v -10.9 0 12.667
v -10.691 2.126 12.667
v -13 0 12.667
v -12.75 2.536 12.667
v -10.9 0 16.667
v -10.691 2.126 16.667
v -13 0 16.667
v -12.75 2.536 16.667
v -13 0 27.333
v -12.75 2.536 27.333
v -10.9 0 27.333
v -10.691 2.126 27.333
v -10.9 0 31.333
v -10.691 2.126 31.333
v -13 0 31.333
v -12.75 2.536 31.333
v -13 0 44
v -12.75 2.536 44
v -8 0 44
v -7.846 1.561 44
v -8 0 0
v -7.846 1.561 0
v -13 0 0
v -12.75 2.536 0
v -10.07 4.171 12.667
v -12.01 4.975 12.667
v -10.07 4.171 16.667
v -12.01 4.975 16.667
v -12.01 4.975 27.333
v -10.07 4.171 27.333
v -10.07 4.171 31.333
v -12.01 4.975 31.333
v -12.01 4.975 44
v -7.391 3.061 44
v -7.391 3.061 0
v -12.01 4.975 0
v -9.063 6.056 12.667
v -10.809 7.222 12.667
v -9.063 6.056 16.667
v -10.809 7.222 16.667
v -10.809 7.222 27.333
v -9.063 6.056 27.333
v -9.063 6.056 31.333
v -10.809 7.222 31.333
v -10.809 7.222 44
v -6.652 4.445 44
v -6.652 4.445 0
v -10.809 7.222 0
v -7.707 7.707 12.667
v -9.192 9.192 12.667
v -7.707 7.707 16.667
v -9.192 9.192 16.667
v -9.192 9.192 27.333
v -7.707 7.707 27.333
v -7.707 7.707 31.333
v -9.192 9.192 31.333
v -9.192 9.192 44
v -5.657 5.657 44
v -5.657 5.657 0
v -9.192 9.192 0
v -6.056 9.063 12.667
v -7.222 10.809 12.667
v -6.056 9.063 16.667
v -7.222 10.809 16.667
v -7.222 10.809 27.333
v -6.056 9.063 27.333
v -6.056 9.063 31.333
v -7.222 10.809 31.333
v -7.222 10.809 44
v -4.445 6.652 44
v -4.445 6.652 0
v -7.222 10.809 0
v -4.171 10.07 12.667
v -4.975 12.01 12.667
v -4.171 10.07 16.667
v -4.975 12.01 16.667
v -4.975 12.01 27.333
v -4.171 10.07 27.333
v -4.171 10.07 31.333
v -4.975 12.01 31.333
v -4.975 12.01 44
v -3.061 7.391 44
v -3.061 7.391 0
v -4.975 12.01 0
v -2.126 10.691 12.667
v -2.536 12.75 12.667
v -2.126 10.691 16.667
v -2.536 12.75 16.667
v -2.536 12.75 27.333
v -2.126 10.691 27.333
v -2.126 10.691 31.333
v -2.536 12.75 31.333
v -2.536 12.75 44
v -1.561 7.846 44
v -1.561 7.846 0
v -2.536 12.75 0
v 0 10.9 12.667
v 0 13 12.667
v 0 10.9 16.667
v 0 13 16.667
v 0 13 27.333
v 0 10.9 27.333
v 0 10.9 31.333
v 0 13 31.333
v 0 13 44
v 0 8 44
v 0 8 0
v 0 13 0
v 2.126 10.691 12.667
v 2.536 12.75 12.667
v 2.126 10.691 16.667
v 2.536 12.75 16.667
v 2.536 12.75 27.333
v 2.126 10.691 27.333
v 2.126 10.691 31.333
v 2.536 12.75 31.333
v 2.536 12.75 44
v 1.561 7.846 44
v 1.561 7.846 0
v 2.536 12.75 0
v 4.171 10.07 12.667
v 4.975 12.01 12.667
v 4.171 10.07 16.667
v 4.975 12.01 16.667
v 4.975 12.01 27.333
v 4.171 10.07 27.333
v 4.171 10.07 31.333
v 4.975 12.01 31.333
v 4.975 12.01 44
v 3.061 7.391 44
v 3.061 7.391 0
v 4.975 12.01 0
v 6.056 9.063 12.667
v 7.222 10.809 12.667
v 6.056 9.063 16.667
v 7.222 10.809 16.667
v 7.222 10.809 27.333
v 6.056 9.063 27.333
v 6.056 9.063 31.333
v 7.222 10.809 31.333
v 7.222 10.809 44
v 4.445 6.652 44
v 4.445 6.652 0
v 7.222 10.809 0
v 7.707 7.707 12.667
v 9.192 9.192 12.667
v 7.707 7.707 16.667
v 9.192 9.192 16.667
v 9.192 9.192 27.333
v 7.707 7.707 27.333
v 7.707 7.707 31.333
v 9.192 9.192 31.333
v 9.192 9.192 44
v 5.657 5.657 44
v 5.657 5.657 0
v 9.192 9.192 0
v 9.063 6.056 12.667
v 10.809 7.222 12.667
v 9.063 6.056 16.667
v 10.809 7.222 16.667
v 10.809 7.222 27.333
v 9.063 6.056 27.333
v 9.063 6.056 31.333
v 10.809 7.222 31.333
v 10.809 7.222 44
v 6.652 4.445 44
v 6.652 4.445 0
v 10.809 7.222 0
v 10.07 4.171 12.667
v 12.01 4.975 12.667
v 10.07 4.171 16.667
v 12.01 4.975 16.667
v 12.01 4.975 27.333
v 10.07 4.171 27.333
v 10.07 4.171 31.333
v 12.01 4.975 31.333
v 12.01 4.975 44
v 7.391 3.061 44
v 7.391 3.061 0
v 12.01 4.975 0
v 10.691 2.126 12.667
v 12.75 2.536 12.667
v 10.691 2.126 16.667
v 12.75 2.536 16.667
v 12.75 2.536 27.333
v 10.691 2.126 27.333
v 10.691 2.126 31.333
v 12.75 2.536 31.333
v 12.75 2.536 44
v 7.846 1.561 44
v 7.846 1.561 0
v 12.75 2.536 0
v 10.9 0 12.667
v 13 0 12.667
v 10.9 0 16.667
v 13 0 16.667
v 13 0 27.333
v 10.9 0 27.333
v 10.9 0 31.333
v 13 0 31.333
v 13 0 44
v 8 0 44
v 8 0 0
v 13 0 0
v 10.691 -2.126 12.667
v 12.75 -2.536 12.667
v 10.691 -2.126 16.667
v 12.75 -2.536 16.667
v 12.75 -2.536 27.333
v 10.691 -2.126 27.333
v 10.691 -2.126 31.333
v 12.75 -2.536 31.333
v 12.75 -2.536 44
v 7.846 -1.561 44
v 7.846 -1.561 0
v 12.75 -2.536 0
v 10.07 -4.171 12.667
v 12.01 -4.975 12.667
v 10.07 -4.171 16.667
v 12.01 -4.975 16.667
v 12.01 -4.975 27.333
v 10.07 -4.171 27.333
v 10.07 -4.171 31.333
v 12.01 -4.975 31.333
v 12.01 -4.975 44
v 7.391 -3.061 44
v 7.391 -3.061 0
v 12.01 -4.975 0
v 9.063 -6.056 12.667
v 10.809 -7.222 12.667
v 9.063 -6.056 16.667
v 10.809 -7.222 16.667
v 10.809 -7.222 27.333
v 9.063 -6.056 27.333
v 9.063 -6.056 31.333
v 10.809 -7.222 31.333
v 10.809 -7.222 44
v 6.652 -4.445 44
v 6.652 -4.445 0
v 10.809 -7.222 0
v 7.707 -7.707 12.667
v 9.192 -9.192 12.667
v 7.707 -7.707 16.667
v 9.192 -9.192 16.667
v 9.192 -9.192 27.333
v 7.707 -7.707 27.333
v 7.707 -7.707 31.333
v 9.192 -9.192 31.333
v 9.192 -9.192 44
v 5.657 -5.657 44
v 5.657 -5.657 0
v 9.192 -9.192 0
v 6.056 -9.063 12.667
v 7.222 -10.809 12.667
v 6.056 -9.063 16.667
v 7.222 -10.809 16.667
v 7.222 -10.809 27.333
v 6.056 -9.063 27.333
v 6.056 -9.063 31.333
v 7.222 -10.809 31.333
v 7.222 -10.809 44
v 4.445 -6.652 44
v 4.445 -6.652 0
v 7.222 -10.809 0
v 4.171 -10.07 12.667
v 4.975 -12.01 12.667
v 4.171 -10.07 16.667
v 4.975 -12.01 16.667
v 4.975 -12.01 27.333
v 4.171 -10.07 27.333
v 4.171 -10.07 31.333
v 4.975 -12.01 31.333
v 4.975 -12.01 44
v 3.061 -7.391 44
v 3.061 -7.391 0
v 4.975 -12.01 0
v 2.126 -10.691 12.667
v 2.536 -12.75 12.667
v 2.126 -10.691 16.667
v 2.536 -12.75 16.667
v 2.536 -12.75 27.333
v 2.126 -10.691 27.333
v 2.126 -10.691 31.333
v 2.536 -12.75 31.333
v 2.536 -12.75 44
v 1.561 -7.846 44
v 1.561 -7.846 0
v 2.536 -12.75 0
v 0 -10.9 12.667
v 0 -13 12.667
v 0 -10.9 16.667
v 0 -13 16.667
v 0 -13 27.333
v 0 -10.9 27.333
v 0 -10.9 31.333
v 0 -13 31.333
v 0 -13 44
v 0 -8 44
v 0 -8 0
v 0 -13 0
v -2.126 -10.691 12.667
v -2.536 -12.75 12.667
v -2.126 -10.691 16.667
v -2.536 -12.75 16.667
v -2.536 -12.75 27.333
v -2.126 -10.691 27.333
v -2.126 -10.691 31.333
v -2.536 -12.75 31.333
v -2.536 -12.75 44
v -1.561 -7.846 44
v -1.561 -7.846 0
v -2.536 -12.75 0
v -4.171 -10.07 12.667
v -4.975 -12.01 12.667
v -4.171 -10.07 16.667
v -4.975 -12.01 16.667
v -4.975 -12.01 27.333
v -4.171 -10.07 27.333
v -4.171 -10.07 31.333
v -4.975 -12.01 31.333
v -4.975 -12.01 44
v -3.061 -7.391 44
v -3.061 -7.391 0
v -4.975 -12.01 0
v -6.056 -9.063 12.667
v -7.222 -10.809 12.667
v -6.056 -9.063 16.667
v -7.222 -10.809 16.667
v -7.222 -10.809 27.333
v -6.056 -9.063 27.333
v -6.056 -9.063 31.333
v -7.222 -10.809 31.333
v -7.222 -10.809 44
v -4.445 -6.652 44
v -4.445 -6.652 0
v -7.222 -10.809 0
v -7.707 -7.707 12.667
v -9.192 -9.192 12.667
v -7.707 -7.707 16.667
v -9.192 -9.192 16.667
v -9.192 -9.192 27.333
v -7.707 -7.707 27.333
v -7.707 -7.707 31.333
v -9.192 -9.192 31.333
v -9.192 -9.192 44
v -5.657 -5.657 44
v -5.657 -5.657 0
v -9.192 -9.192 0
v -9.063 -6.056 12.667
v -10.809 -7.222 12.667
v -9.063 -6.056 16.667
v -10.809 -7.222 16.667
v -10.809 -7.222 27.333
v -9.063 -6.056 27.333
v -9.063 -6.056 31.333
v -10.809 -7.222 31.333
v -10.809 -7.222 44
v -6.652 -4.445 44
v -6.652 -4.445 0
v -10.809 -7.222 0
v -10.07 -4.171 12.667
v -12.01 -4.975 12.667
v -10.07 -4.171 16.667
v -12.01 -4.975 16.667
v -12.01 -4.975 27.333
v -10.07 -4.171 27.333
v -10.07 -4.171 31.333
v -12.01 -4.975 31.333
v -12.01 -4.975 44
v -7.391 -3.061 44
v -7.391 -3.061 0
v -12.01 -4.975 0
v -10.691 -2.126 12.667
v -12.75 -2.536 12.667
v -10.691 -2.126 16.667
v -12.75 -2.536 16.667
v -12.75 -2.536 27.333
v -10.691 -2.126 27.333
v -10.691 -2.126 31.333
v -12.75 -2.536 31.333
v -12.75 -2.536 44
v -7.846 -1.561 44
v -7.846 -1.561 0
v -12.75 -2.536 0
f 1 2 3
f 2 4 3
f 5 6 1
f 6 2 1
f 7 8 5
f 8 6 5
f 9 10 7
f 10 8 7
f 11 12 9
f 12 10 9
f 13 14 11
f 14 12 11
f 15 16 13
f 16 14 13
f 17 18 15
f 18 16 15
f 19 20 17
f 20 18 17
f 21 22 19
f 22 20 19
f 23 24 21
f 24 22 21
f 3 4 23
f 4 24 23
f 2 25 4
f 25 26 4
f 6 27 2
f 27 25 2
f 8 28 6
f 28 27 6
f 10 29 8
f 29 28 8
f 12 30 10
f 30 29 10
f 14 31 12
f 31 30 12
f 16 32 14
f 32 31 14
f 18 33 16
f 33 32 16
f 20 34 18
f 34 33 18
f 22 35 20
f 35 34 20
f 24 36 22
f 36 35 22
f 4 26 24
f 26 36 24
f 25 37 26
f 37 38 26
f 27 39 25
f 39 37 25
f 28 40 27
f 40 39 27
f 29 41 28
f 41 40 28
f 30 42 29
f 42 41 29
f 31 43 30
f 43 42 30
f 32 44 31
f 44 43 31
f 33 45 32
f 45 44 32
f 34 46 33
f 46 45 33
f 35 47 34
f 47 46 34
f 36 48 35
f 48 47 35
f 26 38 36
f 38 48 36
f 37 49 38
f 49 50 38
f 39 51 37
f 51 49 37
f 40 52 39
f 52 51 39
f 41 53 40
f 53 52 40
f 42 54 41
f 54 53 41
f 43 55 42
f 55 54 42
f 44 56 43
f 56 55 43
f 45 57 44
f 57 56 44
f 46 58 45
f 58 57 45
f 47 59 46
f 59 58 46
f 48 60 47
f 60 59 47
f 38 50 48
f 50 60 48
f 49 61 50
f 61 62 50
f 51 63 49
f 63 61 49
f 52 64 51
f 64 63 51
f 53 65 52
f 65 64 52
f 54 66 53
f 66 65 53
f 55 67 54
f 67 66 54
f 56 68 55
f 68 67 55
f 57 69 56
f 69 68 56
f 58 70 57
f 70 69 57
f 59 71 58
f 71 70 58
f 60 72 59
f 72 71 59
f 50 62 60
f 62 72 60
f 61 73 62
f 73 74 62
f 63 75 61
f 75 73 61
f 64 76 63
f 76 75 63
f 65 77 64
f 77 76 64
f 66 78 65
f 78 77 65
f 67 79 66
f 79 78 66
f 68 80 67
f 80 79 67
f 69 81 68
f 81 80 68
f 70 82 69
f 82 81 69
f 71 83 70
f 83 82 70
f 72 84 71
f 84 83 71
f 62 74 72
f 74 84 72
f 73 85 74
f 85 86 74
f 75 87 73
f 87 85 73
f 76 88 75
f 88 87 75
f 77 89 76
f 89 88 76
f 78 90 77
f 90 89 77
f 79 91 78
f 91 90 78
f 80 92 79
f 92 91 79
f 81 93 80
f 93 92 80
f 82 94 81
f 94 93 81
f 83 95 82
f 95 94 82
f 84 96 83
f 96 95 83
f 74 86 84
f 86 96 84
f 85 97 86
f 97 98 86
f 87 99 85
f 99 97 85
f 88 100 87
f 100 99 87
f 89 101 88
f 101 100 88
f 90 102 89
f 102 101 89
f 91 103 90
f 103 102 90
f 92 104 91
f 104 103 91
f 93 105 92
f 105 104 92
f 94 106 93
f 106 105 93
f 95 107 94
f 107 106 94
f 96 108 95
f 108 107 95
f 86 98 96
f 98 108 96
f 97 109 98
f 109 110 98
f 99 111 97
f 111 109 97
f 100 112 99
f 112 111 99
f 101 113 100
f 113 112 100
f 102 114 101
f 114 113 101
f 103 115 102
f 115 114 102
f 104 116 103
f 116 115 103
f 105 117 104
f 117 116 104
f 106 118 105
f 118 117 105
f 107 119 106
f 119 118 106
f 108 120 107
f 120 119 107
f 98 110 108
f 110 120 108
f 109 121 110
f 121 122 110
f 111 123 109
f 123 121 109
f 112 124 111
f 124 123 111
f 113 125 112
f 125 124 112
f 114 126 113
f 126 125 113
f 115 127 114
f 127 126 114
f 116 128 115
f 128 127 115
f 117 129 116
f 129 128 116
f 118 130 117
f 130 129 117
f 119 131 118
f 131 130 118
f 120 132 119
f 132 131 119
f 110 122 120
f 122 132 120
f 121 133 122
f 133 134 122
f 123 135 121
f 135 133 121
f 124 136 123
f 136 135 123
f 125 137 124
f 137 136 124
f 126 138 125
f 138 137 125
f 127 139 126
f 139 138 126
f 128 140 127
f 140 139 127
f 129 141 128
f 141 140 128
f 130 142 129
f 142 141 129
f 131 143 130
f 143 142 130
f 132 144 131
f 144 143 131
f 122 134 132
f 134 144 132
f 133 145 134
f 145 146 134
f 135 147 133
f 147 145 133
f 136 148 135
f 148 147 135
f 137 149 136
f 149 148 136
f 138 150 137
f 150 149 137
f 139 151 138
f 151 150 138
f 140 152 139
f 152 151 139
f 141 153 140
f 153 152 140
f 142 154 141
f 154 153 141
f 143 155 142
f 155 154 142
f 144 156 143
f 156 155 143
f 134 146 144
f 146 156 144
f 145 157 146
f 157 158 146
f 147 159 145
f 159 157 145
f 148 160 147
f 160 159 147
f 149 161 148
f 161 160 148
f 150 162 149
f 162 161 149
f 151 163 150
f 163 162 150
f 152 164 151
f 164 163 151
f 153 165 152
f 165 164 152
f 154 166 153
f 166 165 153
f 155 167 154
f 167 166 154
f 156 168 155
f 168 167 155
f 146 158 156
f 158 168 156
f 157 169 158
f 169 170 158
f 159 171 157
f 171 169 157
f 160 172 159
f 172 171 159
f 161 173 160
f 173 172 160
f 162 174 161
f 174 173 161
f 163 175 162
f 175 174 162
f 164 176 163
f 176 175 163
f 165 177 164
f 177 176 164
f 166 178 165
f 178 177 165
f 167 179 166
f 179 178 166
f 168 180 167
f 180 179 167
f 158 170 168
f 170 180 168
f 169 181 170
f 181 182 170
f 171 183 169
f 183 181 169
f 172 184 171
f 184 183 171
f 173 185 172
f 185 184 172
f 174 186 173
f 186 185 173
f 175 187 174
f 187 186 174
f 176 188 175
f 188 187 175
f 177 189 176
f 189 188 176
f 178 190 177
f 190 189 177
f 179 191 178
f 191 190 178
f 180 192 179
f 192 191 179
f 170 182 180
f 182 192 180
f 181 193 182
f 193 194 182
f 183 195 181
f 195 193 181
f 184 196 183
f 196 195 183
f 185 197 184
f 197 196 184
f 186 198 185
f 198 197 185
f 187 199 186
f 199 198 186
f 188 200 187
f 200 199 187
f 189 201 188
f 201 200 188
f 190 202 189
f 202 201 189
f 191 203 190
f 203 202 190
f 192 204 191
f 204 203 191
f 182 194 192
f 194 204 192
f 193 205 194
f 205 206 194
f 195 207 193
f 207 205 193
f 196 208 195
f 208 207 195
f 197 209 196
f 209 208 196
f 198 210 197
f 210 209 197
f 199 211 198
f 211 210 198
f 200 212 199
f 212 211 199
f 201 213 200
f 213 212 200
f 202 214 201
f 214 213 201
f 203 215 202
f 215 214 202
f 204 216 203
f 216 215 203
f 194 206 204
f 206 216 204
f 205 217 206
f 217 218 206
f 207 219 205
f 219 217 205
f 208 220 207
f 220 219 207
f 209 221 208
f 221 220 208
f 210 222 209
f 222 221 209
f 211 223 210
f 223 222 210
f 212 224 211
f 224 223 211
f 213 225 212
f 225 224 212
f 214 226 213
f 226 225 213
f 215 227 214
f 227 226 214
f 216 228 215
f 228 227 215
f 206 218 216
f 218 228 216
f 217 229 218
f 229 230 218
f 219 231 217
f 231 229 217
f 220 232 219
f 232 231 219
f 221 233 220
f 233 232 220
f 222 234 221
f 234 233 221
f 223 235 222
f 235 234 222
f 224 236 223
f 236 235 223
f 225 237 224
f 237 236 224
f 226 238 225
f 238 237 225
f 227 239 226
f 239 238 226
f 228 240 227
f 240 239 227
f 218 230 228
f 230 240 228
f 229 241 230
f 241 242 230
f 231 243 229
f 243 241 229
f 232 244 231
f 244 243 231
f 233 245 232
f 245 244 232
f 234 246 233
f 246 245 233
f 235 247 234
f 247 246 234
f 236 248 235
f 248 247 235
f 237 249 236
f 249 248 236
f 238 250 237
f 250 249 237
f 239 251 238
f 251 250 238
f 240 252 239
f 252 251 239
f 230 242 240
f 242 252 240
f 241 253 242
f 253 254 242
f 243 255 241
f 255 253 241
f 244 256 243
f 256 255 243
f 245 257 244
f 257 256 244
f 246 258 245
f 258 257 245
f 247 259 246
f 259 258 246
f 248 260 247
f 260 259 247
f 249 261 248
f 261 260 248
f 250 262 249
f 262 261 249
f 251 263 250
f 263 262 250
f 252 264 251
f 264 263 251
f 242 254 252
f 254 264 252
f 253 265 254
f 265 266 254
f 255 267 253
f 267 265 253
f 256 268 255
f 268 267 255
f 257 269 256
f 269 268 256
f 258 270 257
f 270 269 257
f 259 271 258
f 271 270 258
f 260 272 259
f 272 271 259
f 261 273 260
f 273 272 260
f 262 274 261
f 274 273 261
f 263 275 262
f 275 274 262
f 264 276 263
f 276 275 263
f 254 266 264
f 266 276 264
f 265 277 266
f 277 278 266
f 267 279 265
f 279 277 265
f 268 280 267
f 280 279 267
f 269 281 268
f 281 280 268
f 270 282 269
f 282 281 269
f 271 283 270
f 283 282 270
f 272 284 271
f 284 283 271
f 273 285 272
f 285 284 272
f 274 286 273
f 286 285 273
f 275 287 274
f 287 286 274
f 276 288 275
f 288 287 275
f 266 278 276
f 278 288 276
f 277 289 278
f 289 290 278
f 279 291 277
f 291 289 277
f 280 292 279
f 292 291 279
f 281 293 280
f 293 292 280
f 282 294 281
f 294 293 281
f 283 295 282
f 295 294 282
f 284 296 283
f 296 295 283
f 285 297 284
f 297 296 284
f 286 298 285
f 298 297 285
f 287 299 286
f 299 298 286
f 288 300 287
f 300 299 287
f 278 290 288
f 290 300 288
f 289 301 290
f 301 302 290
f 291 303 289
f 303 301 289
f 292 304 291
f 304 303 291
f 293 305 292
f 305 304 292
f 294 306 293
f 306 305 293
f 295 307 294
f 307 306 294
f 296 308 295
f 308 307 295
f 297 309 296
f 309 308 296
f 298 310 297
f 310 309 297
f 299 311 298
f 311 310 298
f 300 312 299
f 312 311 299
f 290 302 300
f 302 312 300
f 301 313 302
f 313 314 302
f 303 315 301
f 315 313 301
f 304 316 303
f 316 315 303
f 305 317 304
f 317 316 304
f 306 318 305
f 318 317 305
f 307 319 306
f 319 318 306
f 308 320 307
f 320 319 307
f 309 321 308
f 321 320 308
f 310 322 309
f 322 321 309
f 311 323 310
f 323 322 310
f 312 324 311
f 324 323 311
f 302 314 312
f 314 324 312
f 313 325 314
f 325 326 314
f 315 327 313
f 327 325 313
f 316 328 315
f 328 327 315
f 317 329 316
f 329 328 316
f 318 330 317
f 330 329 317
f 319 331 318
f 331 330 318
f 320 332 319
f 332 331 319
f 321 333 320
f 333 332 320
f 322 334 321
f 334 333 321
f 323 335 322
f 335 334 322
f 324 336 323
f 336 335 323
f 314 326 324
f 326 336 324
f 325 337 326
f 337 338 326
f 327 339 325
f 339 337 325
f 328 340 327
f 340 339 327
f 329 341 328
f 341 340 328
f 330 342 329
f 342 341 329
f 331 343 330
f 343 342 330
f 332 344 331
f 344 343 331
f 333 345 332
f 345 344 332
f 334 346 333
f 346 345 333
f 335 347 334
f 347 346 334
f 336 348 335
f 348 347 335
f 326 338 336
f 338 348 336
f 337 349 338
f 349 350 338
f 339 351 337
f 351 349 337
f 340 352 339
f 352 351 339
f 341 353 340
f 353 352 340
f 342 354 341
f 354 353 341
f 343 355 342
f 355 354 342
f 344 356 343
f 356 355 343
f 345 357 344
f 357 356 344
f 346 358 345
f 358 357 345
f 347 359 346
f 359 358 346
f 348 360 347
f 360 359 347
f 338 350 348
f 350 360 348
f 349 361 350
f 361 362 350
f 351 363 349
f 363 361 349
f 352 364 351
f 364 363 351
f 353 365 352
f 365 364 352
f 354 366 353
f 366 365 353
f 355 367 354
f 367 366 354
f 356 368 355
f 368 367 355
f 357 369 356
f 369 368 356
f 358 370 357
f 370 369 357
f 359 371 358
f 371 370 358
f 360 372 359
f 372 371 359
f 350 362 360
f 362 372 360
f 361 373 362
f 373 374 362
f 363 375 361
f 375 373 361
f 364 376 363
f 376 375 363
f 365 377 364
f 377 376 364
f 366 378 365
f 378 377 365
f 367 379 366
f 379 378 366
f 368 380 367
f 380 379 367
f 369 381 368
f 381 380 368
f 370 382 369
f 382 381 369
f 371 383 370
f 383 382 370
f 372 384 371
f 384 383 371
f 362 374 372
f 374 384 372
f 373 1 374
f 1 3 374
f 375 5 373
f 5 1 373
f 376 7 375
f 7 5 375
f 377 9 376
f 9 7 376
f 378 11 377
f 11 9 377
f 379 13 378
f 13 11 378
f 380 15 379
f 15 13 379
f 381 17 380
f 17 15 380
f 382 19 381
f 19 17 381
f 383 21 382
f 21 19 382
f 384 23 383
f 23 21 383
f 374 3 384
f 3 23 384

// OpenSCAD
$fn = 32;

// ----------------------------------------------------------------------
// Grooved revolve: stepped, bore R8
// ----------------------------------------------------------------------

// --- parameters (mm) ---
bore_r = 8;               // bore radius
outer_r = 13;             // outer radius of the body
total_h = 44;             // overall height, Z
wall = 5;                 // radial wall thickness
groove_w = 4;             // groove width
groove_d = 2.1;           // groove depth
grooves = 2;              // number of outer grooves

bbox_x = 2 * outer_r;  // full diameter
bore_d = 2 * bore_r;  // bore diameter
body_d = 2 * outer_r;  // body diameter
revolve_angle = 360;  // full turn around the Z axis

profile = [[8, 0], [13, 0], [13, 12.667], [10.9, 12.667], [10.9, 16.667], [13, 16.667], [13, 27.333], [10.9, 27.333], [10.9, 31.333], [13, 31.333], [13, 44], [8, 44]];  // primary outline, 12 points, counter clockwise

// --- the one profile operation ---
rotate_extrude(angle = revolve_angle) polygon(points = profile);
